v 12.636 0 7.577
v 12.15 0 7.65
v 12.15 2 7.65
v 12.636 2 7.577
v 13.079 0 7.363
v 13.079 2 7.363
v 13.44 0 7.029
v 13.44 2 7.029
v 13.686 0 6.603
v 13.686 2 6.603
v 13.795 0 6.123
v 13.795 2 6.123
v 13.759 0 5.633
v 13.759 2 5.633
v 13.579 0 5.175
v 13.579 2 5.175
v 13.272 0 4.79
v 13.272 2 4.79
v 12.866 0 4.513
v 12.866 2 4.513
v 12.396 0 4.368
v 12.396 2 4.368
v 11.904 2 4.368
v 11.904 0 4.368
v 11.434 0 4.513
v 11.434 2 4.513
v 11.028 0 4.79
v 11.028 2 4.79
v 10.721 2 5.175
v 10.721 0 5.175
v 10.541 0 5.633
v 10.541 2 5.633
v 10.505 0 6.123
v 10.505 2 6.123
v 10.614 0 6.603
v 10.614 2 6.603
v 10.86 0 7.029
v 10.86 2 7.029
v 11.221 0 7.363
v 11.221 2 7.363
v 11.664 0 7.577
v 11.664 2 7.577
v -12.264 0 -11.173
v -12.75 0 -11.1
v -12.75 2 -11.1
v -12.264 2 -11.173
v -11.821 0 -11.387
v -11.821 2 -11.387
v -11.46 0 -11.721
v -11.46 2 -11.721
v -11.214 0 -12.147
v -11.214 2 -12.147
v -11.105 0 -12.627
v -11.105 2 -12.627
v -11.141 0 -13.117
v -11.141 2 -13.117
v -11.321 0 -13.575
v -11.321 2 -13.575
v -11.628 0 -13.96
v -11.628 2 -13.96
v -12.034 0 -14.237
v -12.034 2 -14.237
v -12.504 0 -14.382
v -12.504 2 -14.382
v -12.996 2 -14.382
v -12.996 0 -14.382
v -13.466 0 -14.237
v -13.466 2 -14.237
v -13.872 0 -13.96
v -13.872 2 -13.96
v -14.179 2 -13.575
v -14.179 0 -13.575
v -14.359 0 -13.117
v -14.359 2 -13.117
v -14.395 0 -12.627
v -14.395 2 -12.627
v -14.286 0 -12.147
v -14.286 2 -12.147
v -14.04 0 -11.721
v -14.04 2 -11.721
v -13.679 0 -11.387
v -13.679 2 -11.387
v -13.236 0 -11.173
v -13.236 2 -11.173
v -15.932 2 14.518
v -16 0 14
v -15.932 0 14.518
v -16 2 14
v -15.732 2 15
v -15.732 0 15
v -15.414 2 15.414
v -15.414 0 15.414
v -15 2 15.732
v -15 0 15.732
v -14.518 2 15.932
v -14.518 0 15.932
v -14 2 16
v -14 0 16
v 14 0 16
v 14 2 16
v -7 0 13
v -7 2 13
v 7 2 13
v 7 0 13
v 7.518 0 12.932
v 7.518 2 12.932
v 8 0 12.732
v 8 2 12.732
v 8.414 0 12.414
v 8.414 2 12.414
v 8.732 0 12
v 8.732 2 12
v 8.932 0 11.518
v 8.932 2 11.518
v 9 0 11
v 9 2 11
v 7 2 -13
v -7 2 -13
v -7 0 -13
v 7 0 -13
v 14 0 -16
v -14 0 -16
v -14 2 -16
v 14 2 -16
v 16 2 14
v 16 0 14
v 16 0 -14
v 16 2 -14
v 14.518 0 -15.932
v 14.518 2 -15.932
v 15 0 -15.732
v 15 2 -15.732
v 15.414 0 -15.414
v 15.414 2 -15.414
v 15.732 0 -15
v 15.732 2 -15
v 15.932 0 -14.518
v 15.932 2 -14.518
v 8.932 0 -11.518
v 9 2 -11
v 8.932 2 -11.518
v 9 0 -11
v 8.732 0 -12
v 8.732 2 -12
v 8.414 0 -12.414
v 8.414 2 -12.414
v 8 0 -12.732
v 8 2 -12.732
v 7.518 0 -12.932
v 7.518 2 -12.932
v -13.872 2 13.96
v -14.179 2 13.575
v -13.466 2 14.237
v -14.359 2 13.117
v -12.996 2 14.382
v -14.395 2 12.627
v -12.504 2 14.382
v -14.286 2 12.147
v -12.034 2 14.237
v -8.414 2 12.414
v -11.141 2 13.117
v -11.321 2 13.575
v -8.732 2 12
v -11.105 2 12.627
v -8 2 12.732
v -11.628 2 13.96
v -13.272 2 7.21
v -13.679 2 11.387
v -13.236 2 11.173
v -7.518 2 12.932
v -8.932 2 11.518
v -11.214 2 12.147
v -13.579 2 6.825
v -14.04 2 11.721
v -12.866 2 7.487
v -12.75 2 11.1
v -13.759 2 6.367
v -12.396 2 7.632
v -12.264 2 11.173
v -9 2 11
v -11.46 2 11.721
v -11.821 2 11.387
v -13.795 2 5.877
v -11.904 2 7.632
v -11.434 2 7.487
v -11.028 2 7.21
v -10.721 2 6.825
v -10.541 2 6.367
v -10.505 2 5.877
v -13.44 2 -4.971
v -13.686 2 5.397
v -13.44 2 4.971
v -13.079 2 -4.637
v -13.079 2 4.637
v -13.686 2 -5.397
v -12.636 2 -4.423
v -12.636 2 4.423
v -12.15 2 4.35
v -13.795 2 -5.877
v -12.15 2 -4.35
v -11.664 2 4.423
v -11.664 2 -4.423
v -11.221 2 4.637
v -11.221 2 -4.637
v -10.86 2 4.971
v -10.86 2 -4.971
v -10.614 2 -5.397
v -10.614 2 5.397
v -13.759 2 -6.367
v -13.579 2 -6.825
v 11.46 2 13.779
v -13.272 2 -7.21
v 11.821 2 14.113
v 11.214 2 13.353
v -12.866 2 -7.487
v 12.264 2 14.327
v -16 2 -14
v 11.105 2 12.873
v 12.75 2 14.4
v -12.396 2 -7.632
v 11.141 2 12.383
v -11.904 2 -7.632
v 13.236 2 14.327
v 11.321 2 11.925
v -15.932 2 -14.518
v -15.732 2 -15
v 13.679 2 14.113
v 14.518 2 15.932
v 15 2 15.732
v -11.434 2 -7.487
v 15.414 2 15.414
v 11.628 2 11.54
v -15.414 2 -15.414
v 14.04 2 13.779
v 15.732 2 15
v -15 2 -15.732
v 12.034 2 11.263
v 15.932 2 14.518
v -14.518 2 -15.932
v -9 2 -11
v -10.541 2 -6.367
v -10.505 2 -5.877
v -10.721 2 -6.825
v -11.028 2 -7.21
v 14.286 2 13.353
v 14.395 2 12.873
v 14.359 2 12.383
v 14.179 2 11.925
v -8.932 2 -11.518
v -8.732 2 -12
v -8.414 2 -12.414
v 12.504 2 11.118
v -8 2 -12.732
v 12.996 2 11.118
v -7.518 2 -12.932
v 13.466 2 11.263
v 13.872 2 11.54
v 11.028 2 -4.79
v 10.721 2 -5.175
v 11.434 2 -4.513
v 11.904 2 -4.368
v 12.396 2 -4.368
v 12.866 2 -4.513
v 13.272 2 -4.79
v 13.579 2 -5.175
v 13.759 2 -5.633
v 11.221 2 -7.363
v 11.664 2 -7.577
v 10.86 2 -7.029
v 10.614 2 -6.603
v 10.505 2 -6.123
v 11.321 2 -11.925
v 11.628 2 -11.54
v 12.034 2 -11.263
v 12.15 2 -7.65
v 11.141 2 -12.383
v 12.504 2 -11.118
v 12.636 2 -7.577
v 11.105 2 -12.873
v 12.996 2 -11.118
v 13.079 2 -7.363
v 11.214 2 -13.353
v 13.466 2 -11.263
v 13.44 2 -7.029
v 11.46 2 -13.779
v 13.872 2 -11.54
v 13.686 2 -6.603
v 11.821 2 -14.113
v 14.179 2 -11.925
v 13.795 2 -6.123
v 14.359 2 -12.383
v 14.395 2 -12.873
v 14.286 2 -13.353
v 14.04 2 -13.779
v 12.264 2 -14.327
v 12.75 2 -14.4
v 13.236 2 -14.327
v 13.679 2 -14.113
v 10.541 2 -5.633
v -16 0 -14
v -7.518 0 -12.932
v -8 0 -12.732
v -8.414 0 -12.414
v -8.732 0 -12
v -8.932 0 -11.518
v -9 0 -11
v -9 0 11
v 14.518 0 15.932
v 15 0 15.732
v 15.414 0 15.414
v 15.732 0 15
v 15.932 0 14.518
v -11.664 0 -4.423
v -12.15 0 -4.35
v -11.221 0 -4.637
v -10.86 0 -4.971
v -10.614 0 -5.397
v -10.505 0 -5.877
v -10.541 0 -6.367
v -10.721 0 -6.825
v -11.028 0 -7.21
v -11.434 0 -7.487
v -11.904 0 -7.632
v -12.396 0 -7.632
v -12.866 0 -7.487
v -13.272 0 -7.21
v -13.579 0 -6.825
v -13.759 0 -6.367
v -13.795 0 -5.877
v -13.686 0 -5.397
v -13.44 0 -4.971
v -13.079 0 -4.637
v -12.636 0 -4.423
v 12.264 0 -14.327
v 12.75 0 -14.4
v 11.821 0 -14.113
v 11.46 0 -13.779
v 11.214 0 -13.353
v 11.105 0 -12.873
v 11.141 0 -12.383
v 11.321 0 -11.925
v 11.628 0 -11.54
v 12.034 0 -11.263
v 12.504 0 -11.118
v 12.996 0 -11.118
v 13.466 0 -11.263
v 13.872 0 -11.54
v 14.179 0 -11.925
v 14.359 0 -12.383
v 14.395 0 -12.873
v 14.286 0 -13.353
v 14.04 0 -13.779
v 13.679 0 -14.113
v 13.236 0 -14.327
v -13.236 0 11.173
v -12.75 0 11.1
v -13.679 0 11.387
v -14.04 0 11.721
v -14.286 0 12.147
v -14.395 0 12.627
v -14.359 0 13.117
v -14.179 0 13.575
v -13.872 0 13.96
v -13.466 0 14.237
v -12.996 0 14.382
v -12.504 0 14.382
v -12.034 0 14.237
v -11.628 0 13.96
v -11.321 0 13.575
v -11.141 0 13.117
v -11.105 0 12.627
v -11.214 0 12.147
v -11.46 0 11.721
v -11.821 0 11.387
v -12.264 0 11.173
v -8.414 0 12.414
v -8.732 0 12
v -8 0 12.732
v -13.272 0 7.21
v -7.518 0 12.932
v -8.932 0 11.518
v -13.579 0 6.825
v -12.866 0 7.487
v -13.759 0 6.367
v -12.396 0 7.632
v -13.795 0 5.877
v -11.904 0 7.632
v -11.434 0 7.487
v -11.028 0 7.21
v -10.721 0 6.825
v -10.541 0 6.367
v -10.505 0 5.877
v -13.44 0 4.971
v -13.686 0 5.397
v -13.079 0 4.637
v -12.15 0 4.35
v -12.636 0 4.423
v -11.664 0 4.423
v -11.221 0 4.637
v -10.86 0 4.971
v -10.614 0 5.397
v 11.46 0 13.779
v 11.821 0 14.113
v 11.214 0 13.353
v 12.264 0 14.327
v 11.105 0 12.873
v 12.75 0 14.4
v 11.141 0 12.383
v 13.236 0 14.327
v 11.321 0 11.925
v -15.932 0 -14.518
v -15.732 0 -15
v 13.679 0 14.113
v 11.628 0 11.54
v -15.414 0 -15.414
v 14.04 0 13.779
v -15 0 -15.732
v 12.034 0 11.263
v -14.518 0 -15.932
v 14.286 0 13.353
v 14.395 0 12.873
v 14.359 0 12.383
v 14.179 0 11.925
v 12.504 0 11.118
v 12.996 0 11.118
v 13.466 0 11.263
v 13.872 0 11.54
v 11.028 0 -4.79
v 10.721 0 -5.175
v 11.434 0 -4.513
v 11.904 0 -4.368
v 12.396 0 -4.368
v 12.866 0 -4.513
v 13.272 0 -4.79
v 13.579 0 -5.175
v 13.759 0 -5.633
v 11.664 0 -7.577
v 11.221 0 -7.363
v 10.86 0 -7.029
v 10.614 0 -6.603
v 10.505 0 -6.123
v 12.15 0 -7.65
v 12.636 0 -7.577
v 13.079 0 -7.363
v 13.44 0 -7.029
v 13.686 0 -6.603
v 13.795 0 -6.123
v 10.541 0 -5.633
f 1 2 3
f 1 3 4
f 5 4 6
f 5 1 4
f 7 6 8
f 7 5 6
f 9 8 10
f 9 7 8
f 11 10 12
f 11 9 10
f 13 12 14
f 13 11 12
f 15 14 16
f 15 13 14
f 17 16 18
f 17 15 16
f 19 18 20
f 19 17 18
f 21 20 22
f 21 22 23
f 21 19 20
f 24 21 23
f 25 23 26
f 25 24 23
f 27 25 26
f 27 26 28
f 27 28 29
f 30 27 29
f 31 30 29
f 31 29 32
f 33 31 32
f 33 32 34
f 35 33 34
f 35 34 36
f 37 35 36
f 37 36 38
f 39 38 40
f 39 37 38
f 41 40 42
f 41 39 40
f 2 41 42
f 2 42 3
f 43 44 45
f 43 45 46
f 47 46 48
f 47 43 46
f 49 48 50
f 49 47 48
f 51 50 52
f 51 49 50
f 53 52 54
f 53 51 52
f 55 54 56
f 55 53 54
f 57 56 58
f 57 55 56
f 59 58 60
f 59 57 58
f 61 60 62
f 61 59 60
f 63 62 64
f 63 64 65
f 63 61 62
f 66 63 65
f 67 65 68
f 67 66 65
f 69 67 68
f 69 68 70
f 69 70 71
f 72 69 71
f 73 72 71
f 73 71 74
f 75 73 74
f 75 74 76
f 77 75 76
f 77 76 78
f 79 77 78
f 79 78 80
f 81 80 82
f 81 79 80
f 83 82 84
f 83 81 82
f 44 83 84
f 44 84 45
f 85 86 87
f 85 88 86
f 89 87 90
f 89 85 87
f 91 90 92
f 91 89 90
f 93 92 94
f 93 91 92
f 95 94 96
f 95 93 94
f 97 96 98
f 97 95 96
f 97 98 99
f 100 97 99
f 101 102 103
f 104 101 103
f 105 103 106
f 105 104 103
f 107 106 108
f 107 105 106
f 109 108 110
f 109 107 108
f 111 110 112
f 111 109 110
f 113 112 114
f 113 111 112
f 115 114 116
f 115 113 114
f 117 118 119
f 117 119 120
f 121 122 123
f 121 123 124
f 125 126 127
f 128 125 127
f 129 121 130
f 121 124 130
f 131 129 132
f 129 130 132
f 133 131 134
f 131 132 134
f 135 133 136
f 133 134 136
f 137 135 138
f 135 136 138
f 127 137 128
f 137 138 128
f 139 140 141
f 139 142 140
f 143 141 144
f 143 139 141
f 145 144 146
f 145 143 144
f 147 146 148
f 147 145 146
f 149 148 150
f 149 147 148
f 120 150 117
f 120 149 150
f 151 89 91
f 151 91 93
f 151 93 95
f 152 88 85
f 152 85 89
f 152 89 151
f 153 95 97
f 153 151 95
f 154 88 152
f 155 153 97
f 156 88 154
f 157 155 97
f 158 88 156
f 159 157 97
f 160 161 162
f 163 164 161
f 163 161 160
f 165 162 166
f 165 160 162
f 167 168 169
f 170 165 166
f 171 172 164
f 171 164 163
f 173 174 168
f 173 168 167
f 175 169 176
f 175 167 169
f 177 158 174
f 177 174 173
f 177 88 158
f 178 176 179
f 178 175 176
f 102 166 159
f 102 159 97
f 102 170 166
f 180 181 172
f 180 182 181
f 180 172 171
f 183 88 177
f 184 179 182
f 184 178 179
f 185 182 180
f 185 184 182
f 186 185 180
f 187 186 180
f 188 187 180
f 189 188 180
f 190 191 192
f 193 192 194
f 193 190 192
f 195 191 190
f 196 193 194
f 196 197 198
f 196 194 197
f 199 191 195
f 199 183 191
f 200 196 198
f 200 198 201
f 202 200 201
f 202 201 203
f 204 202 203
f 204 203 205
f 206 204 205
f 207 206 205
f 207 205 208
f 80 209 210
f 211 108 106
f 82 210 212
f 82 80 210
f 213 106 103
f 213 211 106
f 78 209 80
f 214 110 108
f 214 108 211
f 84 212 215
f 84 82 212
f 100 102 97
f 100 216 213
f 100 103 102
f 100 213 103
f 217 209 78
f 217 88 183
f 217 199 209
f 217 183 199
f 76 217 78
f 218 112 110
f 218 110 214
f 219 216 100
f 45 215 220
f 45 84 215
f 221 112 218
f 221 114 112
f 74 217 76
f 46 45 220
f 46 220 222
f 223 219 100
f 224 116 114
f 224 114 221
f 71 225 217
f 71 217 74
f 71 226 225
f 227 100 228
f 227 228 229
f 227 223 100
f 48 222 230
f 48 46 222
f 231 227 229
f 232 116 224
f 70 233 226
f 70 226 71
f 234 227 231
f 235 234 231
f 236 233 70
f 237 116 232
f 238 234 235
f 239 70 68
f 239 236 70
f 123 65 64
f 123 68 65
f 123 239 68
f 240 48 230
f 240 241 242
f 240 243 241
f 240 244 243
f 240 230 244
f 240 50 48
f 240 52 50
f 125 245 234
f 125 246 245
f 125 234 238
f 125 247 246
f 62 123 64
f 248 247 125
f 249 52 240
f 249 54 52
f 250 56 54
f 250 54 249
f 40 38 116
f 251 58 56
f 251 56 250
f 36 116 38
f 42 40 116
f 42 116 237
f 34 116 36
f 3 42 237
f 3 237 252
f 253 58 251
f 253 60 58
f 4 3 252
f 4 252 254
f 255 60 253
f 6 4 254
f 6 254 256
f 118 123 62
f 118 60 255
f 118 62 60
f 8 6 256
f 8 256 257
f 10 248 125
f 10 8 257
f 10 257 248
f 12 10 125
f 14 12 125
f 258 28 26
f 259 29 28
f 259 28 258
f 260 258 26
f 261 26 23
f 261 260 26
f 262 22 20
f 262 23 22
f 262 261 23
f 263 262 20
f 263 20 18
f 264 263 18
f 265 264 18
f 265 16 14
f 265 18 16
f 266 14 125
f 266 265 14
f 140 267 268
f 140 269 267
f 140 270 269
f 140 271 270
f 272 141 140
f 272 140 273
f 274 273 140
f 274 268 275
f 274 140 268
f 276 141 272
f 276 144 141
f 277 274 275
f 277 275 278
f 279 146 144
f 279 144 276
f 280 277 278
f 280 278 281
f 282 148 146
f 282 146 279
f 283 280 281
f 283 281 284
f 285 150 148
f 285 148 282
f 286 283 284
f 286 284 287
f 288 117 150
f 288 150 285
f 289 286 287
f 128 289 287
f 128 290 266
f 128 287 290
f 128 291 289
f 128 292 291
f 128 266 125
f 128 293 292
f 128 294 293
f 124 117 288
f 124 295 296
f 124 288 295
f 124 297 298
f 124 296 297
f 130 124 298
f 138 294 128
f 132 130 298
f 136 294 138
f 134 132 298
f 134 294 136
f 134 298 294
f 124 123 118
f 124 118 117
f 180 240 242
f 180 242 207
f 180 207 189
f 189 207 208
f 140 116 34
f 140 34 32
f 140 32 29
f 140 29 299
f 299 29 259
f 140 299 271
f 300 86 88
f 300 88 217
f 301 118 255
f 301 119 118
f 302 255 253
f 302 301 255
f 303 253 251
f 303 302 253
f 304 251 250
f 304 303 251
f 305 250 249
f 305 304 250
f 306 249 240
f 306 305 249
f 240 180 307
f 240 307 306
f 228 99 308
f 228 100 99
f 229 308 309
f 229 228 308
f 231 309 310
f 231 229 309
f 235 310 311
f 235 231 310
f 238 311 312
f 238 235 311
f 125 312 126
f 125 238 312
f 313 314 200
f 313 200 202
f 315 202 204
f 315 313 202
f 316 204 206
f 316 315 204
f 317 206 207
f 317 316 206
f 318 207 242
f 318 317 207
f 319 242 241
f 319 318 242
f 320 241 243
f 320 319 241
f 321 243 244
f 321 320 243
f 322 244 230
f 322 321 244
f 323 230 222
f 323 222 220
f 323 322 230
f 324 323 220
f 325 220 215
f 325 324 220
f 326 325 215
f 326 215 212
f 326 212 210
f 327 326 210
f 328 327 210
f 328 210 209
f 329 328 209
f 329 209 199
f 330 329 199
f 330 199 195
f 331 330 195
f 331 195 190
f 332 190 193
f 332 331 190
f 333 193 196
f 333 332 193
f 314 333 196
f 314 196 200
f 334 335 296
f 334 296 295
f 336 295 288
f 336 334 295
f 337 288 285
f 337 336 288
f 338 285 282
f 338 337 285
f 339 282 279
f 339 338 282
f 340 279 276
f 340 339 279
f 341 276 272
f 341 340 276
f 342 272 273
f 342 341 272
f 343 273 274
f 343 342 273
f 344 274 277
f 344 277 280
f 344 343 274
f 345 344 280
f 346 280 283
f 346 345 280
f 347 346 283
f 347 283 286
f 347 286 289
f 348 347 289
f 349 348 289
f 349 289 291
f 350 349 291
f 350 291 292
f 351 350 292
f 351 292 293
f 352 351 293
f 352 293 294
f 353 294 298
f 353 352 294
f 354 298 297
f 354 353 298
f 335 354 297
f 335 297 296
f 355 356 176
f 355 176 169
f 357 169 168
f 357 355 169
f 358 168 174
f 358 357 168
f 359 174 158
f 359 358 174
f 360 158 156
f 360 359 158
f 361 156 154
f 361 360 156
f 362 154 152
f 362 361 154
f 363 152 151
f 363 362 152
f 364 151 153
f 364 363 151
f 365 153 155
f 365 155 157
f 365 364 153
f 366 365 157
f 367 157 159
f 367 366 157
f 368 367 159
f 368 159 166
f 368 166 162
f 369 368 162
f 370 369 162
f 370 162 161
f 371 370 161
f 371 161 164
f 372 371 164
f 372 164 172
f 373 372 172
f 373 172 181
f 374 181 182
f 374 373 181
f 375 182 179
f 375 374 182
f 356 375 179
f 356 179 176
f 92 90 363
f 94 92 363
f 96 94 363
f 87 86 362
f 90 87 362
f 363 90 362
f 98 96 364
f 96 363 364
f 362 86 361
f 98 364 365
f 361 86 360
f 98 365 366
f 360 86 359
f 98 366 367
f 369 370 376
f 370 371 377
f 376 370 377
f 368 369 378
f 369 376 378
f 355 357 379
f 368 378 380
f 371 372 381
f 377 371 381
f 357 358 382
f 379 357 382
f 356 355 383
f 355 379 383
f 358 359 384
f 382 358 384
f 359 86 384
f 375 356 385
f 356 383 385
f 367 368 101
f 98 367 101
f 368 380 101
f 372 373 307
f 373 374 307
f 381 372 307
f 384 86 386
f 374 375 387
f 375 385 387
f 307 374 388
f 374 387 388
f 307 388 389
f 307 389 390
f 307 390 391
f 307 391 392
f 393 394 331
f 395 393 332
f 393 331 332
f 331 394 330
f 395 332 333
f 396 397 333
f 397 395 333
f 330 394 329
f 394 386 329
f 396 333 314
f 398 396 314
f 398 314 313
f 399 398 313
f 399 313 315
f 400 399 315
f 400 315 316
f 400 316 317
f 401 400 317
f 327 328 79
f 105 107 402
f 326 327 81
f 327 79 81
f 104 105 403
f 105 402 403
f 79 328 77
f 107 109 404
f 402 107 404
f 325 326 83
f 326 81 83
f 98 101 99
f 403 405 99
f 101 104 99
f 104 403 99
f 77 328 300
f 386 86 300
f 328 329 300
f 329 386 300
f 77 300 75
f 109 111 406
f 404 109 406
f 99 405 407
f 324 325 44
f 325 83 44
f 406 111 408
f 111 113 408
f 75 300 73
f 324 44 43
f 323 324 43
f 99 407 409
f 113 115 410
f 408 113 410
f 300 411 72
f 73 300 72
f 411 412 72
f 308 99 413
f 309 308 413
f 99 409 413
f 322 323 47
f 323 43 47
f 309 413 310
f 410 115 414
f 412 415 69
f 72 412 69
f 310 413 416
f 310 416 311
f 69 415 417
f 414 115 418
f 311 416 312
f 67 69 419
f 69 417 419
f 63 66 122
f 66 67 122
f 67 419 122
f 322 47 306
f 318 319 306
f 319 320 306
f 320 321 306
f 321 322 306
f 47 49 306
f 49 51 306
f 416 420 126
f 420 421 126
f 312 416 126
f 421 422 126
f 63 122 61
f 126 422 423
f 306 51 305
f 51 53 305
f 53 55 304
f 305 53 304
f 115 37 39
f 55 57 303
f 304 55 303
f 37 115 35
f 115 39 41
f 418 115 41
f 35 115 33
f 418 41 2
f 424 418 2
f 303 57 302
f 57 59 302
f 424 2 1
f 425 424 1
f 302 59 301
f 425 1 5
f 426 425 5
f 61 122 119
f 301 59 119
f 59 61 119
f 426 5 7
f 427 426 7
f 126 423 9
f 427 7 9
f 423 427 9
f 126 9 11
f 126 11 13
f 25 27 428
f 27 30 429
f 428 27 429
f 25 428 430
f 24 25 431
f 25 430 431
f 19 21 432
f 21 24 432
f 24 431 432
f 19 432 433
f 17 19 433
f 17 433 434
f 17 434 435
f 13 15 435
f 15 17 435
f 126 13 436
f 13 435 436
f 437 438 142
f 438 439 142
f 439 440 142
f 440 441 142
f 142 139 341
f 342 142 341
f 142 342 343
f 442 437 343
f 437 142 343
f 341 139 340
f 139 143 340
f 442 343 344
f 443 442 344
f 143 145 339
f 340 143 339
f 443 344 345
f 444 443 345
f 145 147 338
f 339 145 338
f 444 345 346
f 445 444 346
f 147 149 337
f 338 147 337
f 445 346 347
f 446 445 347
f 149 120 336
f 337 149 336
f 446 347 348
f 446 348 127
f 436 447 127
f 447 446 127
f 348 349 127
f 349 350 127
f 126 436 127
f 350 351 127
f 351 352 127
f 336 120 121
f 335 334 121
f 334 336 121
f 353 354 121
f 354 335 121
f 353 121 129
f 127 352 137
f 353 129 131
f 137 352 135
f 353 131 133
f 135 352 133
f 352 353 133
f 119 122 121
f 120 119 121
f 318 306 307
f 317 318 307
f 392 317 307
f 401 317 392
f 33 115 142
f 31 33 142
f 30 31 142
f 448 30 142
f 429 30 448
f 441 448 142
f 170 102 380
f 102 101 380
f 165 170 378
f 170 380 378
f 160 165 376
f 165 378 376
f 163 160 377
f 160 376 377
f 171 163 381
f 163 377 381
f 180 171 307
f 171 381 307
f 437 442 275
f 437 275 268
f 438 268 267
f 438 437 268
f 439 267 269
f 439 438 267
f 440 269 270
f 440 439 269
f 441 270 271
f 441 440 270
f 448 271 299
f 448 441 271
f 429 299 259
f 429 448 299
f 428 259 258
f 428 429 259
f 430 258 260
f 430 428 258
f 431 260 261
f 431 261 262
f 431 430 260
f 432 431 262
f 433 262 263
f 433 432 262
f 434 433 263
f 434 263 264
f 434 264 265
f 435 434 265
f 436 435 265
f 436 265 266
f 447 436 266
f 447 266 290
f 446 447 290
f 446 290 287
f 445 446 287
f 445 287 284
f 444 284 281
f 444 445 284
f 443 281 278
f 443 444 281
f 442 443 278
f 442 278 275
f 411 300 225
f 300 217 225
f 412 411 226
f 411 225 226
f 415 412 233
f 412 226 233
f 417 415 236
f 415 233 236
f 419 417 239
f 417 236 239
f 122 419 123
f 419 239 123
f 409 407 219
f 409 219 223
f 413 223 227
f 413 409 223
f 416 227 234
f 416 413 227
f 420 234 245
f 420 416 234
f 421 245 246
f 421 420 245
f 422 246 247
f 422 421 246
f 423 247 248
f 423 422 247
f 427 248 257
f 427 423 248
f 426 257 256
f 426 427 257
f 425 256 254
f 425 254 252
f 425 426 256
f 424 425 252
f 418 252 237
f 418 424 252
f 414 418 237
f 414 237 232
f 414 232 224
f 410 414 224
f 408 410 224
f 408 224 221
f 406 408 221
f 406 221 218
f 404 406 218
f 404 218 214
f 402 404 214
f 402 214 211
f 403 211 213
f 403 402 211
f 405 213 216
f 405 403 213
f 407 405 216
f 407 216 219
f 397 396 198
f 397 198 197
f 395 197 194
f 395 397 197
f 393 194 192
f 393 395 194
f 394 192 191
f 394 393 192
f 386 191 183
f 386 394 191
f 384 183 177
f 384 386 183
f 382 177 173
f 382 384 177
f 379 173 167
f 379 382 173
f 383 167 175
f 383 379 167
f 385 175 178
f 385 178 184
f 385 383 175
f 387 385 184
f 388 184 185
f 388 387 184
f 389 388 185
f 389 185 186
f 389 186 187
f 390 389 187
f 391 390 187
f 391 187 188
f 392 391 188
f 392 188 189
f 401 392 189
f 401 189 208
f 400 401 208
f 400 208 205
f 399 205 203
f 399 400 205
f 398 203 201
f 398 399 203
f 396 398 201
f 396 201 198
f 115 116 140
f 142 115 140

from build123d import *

# Parameters (mm, degrees)
SKETCH_1_W          = 32
SKETCH_1_H          = 32
SKETCH_1_R          = 1.65
EXTRUDE_1_DEPTH     = 2
SKETCH_2_W          = 18
SKETCH_2_H          = 26
CUT_EXTRUDE_1_DEPTH = 23.715633383
FILLET_1_R          = 2


with BuildPart() as part:
    # 草图1 → 凸台-拉伸1 (new body)
    with BuildSketch(Plane(origin=(0, 0, 0), x_dir=(1, 0, 0), z_dir=(0, 1, 0))):
        Rectangle(SKETCH_1_W, SKETCH_1_H)
        with Locations(Location((-12.75, 12.75, 0), (0, 0, 270))):
            Circle(SKETCH_1_R, mode=Mode.SUBTRACT)
        with Locations(Location((12.75, 12.75, 0), (0, 0, 90))):
            Circle(SKETCH_1_R, mode=Mode.SUBTRACT)
        with Locations(Location((12.75, -12.75, 0), (0, 0, 270))):
            Circle(SKETCH_1_R, mode=Mode.SUBTRACT)
        with Locations(Location((-12.75, -12.75, 0), (0, 0, 90))):
            Circle(SKETCH_1_R, mode=Mode.SUBTRACT)
        with Locations(Location((-12.15, 6, 0), (0, 0, 270))):
            Circle(SKETCH_1_R, mode=Mode.SUBTRACT)
        with Locations(Location((-12.15, -6, 0), (0, 0, 90))):
            Circle(SKETCH_1_R, mode=Mode.SUBTRACT)
        with Locations(Location((12.15, -6, 0), (0, 0, 270))):
            Circle(SKETCH_1_R, mode=Mode.SUBTRACT)
        with Locations(Location((12.15, 6, 0), (0, 0, 90))):
            Circle(SKETCH_1_R, mode=Mode.SUBTRACT)
    extrude(amount=EXTRUDE_1_DEPTH)

    # 草图2 → 切除-拉伸1 (cut, through all)
    with BuildSketch(Plane(origin=(0, 2, 0), x_dir=(1, 0, 0), z_dir=(0, 1, 0))):
        Rectangle(SKETCH_2_W, SKETCH_2_H)
    extrude(amount=-CUT_EXTRUDE_1_DEPTH, mode=Mode.SUBTRACT)

    # 圆角1
    fillet_1_edges = [part.edges().sort_by_distance(p)[0] for p in [
        (-9, 1, 13),
        (-9, 1, -13),
        (9, 1, -13),
        (9, 1, 13),
        (16, 1, 16),
        (-16, 1, 16),
        (-16, 1, -16),
        (16, 1, -16),
    ]]
    fillet(fillet_1_edges, radius=FILLET_1_R)


solid = part.part
